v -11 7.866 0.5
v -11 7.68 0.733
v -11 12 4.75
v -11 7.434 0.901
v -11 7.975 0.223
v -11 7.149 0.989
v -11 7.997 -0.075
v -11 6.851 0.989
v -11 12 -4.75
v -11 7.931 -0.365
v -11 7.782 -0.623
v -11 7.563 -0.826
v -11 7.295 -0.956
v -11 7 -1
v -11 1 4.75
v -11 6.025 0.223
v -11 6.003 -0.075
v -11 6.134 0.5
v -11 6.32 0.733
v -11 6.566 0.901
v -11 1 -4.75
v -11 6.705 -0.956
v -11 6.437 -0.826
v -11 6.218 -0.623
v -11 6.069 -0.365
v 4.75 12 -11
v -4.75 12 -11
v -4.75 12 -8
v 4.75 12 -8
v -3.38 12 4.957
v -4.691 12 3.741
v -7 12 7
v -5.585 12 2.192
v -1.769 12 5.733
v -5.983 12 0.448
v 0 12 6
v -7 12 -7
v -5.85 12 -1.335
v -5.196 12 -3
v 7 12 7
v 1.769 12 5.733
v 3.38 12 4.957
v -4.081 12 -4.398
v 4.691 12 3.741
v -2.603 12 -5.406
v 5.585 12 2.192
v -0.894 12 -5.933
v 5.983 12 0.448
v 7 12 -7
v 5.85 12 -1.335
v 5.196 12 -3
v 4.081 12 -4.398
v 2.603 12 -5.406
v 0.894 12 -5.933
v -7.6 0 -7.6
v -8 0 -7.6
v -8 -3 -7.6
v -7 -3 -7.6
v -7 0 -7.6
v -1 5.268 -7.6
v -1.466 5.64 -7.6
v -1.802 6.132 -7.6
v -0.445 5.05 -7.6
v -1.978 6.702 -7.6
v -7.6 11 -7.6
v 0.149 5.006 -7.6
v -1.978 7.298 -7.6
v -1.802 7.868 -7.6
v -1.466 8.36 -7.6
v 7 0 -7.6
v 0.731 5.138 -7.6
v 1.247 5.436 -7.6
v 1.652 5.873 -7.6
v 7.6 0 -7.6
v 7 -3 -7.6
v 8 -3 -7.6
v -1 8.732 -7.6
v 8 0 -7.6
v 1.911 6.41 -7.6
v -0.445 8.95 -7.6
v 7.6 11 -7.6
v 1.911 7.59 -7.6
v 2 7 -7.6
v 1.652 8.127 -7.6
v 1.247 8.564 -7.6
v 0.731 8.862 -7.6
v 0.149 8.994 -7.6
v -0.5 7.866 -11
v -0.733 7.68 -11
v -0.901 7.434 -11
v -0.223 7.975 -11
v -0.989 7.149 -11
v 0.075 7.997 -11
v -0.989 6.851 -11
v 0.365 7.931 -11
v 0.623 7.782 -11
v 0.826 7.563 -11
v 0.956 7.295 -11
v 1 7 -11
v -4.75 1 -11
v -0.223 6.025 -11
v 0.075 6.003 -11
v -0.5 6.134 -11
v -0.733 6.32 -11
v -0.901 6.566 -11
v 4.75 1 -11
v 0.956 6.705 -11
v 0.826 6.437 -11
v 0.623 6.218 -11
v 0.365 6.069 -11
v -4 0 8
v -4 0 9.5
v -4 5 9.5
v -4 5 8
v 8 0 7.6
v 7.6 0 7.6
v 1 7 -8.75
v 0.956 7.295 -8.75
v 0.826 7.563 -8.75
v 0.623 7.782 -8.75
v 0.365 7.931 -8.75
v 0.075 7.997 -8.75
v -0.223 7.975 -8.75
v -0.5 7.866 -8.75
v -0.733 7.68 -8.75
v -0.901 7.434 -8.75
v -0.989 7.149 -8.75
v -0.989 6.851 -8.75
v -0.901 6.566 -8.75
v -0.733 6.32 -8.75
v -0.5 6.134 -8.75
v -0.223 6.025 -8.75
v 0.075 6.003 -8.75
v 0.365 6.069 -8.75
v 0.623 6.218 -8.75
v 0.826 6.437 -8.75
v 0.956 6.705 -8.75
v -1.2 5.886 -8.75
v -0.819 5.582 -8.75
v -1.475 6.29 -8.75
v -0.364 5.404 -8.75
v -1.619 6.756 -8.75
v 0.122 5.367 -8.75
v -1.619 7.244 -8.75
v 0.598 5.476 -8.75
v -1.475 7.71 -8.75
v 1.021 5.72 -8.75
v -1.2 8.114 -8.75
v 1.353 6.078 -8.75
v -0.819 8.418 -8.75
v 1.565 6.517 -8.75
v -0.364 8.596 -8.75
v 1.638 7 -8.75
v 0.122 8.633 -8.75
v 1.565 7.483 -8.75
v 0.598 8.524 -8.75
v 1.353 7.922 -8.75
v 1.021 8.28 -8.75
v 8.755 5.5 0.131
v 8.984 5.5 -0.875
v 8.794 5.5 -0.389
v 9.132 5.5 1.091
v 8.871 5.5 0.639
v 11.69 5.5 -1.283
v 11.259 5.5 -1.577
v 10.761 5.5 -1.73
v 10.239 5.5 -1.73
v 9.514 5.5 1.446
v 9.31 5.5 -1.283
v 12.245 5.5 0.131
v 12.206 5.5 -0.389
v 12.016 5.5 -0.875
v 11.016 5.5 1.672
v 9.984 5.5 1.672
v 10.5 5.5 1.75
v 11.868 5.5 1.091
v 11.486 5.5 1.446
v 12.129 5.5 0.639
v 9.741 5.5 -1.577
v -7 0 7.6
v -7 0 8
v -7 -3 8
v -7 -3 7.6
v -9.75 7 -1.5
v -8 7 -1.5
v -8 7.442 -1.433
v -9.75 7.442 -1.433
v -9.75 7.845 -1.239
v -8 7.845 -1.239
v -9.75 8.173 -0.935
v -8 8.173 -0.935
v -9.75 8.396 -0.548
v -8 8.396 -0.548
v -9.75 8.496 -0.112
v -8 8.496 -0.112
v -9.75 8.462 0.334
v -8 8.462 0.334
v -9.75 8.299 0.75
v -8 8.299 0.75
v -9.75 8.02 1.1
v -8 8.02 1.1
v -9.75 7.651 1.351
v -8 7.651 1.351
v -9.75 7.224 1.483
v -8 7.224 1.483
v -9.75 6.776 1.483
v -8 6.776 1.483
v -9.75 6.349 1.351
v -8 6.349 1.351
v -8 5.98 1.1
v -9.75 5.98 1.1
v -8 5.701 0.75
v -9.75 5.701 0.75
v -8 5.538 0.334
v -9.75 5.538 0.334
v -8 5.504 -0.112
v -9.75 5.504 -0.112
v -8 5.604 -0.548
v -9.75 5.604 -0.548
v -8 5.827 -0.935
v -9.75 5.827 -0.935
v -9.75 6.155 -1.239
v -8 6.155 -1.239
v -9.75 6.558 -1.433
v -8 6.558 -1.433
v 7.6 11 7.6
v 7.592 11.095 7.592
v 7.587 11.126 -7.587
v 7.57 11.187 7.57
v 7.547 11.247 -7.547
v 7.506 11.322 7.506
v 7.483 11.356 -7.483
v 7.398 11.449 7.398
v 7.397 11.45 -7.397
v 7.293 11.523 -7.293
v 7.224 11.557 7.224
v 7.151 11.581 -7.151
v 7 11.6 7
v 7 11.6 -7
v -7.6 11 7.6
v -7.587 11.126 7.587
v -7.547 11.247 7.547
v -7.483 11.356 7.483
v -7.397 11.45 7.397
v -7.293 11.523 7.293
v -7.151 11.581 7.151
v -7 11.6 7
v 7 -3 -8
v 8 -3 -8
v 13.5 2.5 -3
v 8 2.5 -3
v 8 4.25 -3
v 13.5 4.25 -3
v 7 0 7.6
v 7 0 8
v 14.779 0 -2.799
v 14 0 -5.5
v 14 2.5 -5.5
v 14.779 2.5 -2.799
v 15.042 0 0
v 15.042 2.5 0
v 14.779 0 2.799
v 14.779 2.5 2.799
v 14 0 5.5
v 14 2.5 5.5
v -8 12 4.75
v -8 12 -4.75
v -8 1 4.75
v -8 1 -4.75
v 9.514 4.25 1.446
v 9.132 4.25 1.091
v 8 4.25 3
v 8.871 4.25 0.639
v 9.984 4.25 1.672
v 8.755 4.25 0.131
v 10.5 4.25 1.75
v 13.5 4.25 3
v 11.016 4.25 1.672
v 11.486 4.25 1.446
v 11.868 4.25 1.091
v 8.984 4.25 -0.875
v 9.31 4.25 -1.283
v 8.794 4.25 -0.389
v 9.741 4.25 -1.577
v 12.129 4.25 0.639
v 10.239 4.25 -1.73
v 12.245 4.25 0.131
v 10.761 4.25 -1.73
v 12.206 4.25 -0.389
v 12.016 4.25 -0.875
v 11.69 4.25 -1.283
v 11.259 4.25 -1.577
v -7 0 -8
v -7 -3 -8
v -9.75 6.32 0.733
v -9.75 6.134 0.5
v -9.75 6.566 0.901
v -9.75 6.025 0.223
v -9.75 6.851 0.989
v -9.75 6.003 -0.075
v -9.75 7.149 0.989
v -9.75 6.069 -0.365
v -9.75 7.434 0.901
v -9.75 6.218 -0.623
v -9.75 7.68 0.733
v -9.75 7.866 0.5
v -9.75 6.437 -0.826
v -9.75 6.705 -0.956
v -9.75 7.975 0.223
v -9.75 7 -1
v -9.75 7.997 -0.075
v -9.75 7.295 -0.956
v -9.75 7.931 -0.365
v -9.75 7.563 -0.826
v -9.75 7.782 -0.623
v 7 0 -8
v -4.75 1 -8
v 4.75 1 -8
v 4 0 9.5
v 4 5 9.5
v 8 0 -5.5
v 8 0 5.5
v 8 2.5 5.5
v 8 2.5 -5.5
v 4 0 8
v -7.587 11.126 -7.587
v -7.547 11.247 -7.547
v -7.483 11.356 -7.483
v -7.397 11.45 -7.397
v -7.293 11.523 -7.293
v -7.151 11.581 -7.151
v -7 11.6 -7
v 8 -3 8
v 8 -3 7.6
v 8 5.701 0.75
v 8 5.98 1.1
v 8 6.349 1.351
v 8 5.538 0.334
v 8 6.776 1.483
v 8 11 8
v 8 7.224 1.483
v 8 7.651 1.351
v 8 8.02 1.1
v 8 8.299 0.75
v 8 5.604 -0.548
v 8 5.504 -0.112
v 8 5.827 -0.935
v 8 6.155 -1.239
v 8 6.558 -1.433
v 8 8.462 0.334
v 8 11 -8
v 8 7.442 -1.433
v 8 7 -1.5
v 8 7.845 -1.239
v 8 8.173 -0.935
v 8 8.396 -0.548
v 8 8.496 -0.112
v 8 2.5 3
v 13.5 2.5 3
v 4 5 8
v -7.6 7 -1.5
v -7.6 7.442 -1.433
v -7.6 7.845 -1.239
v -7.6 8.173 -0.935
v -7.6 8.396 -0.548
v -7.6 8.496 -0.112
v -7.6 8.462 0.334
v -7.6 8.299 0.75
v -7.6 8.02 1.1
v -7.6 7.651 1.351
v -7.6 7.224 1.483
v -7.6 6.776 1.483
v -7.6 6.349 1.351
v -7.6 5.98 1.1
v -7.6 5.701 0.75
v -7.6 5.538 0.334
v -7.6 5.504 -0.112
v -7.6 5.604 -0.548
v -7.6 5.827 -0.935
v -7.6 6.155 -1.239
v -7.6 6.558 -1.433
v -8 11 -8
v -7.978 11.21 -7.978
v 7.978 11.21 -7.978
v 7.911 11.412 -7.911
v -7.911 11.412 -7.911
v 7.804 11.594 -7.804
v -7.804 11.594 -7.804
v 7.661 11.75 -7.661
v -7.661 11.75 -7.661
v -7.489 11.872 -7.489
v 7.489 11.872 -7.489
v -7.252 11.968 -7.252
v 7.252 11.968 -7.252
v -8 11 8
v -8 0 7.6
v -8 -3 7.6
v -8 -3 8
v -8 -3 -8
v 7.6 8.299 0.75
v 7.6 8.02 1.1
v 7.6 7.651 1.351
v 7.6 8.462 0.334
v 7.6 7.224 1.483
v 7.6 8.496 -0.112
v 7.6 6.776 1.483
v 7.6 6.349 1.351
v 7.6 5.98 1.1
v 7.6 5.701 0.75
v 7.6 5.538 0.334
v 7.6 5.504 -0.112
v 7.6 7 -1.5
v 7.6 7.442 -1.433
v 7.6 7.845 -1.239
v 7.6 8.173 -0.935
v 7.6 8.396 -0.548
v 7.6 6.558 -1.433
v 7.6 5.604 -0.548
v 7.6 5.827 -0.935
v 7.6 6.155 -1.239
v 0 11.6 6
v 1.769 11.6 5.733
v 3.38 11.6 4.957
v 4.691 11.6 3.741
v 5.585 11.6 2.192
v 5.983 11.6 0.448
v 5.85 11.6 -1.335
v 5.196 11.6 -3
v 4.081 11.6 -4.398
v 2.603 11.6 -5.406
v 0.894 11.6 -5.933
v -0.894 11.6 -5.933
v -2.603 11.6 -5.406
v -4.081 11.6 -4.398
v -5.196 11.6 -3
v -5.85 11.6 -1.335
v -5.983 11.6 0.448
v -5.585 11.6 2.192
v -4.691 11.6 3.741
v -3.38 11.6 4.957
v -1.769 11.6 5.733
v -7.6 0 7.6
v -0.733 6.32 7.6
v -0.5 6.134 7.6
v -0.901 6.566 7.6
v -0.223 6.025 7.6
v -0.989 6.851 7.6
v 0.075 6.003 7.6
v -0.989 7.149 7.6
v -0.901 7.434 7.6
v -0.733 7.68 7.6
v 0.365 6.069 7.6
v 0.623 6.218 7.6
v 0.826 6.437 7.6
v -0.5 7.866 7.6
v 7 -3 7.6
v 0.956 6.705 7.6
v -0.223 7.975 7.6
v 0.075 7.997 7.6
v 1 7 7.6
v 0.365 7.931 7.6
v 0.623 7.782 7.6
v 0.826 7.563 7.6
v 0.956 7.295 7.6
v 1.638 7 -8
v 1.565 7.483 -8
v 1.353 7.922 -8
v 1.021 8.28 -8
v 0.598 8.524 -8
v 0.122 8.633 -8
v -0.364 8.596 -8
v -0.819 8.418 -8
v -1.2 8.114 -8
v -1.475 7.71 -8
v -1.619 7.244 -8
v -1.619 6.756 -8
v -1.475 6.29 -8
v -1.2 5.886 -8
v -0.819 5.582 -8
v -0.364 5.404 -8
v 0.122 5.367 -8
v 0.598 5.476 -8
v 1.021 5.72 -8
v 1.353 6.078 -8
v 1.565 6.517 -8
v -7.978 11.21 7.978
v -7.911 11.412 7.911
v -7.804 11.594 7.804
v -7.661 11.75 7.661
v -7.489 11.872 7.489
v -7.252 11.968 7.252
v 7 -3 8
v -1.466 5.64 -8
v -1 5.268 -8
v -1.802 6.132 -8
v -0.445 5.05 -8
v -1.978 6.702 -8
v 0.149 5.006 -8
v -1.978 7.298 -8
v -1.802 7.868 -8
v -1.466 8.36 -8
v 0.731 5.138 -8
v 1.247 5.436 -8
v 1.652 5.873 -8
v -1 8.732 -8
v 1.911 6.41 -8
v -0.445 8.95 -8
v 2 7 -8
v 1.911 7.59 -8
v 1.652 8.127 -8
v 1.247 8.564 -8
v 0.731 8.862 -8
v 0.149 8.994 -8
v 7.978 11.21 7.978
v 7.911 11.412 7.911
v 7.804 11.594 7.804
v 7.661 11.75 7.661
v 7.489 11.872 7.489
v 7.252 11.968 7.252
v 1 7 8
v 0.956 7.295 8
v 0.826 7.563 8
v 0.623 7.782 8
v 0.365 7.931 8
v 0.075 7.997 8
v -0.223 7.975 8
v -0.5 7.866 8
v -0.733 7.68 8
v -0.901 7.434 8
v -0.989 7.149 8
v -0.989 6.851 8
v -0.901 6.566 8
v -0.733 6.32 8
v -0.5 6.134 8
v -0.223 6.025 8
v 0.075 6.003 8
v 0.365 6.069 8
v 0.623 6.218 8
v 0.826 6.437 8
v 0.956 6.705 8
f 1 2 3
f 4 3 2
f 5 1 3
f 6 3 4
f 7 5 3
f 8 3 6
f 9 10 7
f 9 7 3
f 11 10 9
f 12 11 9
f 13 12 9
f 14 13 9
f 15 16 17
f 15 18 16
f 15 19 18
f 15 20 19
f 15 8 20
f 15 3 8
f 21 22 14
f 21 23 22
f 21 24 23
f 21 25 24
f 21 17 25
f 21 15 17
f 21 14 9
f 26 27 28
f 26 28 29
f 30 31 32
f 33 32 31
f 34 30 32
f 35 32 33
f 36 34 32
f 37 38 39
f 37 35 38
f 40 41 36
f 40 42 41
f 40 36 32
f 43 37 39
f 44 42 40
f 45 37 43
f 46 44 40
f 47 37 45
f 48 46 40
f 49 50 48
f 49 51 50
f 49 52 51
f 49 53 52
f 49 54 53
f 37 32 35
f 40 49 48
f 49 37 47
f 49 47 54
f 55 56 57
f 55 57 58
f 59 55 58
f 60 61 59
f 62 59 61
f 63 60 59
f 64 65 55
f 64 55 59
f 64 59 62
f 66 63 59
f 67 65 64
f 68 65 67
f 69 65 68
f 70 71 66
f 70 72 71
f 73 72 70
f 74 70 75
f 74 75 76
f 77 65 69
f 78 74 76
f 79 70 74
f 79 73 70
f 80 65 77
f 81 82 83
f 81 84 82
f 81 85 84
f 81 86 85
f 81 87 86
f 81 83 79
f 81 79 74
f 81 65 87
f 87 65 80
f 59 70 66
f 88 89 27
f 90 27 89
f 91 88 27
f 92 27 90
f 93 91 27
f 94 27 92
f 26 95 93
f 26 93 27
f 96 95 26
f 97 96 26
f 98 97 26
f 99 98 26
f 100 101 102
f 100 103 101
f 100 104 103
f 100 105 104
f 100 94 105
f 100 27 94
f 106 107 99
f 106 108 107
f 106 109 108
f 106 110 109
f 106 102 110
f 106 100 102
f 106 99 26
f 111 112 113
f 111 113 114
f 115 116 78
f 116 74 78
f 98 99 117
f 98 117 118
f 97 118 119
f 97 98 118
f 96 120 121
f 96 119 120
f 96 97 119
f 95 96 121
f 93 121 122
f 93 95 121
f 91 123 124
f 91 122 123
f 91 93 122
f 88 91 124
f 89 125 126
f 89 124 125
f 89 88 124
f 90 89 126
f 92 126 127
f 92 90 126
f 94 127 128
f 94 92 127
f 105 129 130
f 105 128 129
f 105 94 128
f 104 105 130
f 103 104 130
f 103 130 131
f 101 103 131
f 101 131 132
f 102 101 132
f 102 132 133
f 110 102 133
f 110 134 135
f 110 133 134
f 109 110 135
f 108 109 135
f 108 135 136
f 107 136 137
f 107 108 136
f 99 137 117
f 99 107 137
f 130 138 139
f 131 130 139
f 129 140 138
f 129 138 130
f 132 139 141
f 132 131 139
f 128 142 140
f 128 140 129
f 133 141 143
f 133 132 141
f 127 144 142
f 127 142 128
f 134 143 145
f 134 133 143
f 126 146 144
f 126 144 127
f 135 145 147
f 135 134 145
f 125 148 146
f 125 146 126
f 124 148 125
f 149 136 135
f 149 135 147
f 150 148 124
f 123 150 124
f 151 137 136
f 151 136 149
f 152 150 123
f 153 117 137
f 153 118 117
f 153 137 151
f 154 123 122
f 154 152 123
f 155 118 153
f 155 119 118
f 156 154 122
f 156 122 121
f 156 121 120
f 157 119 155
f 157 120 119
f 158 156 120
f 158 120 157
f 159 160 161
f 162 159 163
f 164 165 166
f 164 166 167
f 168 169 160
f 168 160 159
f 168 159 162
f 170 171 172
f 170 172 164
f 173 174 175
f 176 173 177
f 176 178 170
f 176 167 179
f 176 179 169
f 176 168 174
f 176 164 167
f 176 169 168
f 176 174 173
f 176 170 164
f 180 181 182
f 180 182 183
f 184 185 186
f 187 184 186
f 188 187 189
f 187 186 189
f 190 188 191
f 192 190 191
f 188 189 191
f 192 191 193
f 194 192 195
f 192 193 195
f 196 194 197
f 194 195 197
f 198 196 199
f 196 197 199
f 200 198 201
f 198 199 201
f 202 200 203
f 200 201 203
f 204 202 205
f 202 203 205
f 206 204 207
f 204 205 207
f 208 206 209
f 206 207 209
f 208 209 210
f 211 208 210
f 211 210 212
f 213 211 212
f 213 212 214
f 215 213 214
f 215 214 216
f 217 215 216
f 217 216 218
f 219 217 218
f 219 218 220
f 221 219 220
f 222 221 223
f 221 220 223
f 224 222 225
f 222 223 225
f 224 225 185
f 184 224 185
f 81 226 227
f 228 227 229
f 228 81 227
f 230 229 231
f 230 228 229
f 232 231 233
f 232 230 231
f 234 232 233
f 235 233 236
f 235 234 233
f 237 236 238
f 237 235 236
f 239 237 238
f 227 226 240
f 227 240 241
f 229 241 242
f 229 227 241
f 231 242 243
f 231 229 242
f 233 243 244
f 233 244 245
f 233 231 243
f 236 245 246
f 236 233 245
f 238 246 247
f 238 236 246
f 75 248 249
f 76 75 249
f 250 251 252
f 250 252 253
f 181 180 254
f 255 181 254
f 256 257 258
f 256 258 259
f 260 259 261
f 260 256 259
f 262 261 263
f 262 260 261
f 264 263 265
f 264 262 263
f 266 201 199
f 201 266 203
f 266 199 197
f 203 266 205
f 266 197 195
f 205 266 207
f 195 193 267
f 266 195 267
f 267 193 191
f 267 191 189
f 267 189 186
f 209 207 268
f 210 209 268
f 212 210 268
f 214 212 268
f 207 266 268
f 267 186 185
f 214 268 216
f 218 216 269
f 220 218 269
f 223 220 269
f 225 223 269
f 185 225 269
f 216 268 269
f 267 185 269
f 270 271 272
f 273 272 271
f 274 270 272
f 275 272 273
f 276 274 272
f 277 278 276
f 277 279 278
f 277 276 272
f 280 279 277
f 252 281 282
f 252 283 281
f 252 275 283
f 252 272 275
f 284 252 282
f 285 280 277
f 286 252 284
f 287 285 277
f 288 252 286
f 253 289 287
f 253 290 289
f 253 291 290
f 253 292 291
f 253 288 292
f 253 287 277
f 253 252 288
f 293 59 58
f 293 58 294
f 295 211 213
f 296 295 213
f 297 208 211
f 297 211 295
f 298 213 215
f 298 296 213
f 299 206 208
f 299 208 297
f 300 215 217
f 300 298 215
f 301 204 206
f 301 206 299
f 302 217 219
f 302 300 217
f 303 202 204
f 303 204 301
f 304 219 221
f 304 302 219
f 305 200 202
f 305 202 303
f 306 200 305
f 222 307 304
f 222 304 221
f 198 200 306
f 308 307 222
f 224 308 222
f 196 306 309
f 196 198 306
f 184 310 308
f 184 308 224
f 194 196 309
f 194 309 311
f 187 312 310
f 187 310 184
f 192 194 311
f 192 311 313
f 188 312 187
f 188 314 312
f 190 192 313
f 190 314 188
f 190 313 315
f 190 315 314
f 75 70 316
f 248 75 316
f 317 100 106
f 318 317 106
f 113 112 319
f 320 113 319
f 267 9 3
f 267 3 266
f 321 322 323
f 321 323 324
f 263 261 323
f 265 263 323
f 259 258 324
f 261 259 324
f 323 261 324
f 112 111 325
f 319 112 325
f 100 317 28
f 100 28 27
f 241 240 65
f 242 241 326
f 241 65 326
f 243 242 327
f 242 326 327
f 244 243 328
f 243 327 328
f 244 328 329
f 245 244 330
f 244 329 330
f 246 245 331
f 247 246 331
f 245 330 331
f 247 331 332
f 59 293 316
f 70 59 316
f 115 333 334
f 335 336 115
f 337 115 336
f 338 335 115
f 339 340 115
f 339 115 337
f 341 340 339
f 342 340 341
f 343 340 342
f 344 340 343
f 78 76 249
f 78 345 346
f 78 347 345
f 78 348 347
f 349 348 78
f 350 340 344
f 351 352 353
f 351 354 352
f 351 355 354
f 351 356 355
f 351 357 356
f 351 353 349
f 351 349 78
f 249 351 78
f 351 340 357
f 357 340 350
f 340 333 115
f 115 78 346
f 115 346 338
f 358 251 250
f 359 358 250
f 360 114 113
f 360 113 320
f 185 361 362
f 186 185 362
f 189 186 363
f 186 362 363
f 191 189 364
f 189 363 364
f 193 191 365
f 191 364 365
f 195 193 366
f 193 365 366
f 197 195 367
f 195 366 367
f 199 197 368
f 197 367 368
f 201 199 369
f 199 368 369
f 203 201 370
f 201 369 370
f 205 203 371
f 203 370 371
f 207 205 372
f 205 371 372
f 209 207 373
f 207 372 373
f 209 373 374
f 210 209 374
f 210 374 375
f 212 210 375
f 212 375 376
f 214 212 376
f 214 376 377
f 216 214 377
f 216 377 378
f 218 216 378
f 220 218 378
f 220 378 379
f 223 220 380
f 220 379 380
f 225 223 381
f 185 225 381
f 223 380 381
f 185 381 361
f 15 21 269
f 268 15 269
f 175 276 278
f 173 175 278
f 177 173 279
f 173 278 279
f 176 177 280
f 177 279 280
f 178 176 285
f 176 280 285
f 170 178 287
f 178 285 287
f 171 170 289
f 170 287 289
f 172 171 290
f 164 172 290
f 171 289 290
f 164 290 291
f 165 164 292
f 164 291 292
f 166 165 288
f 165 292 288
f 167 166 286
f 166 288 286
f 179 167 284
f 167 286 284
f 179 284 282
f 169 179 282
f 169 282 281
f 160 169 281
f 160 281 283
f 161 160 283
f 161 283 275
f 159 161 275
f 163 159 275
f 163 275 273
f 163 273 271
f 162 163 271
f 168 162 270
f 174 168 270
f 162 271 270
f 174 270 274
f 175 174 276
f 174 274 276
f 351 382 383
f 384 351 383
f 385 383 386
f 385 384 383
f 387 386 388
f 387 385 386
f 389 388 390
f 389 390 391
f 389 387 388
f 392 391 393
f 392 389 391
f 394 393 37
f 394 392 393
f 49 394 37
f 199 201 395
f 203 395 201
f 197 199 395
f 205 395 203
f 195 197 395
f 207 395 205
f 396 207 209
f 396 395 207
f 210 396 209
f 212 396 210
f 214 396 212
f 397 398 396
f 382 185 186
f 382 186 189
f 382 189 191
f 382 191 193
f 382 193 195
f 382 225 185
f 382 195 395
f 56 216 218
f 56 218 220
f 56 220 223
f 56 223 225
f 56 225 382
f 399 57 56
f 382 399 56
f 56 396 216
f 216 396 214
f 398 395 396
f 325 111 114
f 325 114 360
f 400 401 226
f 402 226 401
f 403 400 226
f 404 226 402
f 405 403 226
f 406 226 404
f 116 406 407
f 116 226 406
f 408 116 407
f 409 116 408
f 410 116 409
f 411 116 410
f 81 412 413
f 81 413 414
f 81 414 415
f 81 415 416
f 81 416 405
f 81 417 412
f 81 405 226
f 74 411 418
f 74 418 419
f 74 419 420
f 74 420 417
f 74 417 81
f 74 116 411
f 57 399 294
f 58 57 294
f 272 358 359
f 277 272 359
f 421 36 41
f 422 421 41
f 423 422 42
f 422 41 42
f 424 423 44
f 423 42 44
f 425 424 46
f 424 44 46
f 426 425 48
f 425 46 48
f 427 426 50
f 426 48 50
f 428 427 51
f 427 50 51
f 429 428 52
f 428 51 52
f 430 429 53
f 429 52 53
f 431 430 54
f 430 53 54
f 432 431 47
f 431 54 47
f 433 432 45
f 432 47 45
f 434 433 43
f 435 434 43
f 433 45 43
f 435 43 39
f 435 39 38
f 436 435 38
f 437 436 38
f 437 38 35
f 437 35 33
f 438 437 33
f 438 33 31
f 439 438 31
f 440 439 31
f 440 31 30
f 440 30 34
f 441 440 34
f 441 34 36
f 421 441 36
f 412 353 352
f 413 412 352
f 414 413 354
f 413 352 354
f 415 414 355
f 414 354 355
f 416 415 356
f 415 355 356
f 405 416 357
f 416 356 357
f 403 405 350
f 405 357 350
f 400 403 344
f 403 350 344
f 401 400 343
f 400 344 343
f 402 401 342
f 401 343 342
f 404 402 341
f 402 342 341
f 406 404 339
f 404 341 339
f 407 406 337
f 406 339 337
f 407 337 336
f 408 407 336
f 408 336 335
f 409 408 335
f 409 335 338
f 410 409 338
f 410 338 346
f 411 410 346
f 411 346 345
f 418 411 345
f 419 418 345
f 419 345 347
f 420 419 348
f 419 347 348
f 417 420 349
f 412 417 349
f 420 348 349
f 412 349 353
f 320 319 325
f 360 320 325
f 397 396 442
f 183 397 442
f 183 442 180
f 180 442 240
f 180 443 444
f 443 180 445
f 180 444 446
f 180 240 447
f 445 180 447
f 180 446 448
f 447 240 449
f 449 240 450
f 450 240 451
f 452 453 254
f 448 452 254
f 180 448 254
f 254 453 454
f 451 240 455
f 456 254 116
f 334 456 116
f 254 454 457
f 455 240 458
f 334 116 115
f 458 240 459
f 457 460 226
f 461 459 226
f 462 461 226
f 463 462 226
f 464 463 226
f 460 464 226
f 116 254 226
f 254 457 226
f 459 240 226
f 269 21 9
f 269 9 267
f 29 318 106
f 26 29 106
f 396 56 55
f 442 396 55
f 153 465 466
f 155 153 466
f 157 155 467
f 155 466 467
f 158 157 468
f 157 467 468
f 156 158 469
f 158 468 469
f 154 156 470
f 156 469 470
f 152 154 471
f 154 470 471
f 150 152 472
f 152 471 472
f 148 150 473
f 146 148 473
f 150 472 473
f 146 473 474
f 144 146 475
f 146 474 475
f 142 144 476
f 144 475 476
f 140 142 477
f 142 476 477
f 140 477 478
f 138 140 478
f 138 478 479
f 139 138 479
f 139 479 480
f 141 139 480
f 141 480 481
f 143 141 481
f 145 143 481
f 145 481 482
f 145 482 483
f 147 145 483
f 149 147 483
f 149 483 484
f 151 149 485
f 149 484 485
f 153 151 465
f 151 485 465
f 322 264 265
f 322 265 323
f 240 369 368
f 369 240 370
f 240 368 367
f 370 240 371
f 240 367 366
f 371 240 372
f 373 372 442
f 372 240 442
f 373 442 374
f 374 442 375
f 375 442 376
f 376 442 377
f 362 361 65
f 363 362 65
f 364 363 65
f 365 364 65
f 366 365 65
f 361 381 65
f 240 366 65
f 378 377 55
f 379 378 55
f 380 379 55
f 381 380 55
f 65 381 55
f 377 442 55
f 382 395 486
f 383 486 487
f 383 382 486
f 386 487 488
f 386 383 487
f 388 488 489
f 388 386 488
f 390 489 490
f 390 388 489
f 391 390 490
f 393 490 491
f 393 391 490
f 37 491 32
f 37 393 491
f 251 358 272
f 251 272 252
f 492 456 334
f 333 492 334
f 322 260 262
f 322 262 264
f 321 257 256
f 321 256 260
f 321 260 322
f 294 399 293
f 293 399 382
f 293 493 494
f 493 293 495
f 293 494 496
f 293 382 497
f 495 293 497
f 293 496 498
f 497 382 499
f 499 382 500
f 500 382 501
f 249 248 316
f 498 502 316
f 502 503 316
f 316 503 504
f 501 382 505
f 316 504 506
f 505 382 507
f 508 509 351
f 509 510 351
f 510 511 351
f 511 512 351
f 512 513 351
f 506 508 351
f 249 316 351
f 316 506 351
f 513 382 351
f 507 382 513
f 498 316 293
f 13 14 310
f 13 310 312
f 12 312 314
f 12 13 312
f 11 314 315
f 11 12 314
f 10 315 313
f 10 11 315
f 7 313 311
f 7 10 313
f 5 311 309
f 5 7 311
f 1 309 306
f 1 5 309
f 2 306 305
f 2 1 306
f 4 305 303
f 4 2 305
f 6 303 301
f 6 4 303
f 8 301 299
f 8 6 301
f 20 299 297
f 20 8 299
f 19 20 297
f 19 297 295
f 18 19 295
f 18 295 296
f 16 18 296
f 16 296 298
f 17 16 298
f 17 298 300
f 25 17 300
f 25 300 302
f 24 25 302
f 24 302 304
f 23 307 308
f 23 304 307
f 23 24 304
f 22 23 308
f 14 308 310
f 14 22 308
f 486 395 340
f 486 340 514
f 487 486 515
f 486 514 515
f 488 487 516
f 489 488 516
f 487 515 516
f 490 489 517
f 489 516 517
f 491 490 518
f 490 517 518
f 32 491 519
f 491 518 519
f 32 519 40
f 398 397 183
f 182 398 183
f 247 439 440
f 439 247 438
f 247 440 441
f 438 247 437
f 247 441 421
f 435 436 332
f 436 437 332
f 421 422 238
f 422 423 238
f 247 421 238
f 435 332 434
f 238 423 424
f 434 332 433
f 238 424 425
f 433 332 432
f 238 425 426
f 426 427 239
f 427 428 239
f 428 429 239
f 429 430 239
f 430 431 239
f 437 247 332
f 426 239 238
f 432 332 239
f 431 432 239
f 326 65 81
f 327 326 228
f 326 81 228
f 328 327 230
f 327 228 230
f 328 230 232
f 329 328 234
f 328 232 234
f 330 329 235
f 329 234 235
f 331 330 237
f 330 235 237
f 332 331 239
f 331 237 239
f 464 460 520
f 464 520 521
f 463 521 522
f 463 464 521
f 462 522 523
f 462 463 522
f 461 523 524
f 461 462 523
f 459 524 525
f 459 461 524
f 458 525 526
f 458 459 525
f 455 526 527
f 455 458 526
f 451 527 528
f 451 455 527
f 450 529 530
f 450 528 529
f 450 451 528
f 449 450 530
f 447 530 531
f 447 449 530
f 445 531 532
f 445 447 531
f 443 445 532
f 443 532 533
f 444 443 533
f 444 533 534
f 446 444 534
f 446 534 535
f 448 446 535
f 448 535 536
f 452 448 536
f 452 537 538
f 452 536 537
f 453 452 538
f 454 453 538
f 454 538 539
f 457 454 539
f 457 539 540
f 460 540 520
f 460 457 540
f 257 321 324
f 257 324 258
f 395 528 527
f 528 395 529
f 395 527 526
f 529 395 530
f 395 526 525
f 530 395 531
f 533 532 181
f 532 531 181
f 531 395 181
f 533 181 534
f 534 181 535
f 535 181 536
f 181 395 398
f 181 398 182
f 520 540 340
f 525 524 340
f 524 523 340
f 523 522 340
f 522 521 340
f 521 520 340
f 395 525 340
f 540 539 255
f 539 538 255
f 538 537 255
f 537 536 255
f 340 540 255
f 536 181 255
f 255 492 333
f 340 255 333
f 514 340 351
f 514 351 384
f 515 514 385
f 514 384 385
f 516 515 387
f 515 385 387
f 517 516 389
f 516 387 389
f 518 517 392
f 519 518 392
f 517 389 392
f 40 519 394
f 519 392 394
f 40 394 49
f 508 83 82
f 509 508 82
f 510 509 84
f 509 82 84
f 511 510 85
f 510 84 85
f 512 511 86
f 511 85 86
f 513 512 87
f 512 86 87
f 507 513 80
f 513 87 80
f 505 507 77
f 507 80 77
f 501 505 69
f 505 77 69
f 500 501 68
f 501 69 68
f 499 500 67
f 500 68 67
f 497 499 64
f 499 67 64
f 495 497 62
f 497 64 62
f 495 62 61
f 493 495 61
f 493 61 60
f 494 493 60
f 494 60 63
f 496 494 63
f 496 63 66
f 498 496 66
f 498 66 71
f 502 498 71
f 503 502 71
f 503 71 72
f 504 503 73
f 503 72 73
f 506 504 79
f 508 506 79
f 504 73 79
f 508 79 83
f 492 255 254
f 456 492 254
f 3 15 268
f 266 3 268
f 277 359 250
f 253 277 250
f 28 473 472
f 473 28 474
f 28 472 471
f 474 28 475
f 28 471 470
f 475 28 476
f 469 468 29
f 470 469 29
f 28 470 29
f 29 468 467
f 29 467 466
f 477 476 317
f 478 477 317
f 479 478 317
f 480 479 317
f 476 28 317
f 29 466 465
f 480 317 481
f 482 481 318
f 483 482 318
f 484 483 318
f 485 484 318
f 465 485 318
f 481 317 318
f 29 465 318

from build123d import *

# Parameters (mm, degrees)
SKETCH1_W            = 16
SKETCH1_H            = 16
EXTRUDE1_DEPTH       = 12
FILLET1_R            = 1
SHELL1_T             = -0.4
SKETCH2_R            = 6
EXTRUDE2_DEPTH       = 17.492422502
SKETCH4_W            = 8
SKETCH4_H            = 1.5
EXTRUDE3_DEPTH       = 5
EXTRUDE4_START       = 1
SKETCH5_W            = 3
SKETCH5_H            = 9.5
EXTRUDE4_DEPTH       = 11
EXTRUDE5_START       = 1
SKETCH6_W            = 9.5
SKETCH6_H            = 3
EXTRUDE5_DEPTH       = 11
EXTRUDE6_DEPTH       = 2.5
SKETCH8_W            = 5.5
SKETCH8_H            = 6
EXTRUDE7_DEPTH       = 1.75
SKETCH9_R            = 1.75
EXTRUDE8_DEPTH       = 1.25
EXTRUDE9_DEPTH       = 23.164160259
EXTRUDE9_DEPTH_BACK  = 23.164160259
SKETCH10_R           = 1
EXTRUDE10_DEPTH      = 23.164160259
EXTRUDE10_DEPTH_BACK = 23.164160259
SKETCH11_R           = 1
SKETCH12_W           = 1
SKETCH12_H           = 0.4
EXTRUDE11_DEPTH      = 3
SKETCH13_R           = 1.5
EXTRUDE12_DEPTH      = 0.4
SKETCH14_R           = 1.5
EXTRUDE13_DEPTH      = 0.4
SKETCH15_R           = 1.5
CUT_EXTRUDE1_DEPTH   = 1.75
SKETCH17_R           = 1.6375
CUT_EXTRUDE2_DEPTH   = 0.75
SKETCH18_R           = 1.5
CUT_EXTRUDE3_DEPTH   = 0.4
SKETCH19_R           = 2
EXTRUDE14_DEPTH      = 0.4


with BuildPart() as part:
    # Sketch1 → Extrude1 (new body)
    with BuildSketch(Plane(origin=(0, 0, 0), x_dir=(1, 0, 0), z_dir=(0, 1, 0))):
        Rectangle(SKETCH1_W, SKETCH1_H)
    extrude(amount=EXTRUDE1_DEPTH)

    # Fillet1
    fillet1_edges = [part.edges().sort_by_distance(p)[0] for p in [
        (-8, 12, 0),
        (0, 12, 8),
        (8, 12, 0),
        (0, 12, -8),
    ]]
    fillet(fillet1_edges, radius=FILLET1_R)

    # Shell1
    shell1_openings = [part.faces().sort_by_distance(p)[0] for p in [
        (0, 0, 0),
    ]]
    offset(amount=SHELL1_T, openings=shell1_openings)

    # Sketch2 → Extrude2 (cut, through all)
    with BuildSketch(Plane(origin=(0, 12, 0), x_dir=(1, 0, 0), z_dir=(0, 1, 0))):
        with Locations(Location((0, 0, 0), (0, 0, 270))):
            Circle(SKETCH2_R)
    extrude(amount=-EXTRUDE2_DEPTH, mode=Mode.SUBTRACT)


with BuildPart() as body_2:
    # Sketch4 → Extrude3 (new body)
    with BuildSketch(Plane(origin=(0, 0, 0), x_dir=(1, 0, 0), z_dir=(0, 1, 0))):
        with Locations((0, -8.75)):
            Rectangle(SKETCH4_W, SKETCH4_H)
    extrude(amount=EXTRUDE3_DEPTH)


with BuildPart() as body_3:
    # Sketch5 → Extrude4 (new body)
    with BuildSketch(Plane(origin=(0, 0, 0), x_dir=(1, 0, 0), z_dir=(0, 1, 0)).offset(EXTRUDE4_START)):
        with Locations((-9.5, 0)):
            Rectangle(SKETCH5_W, SKETCH5_H)
    extrude(amount=EXTRUDE4_DEPTH)


with BuildPart() as body_4:
    # Sketch6 → Extrude5 (new body)
    with BuildSketch(Plane(origin=(0, 0, 0), x_dir=(1, 0, 0), z_dir=(0, 1, 0)).offset(EXTRUDE5_START)):
        with Locations((0, 9.5)):
            Rectangle(SKETCH6_W, SKETCH6_H)
    extrude(amount=EXTRUDE5_DEPTH)


with BuildPart() as body_5:
    # Sketch7 → Extrude6 (new body)
    with BuildSketch(Plane(origin=(0, 0, 0), x_dir=(1, 0, 0), z_dir=(0, 1, 0))):
        with BuildLine():
            Line((8, 5.5), (14, 5.5))
            ThreePointArc((14, 5.5), (15.041608956, 0), (14, -5.5))
            Line((14, -5.5), (8, -5.5))
            Line((8, -5.5), (8, 5.5))
        make_face()
    extrude(amount=EXTRUDE6_DEPTH)


with BuildPart() as body_6:
    # Sketch8 → Extrude7 (new body)
    with BuildSketch(Plane(origin=(0, 2.5, 0), x_dir=(1, 0, 0), z_dir=(0, 1, 0))):
        with Locations((10.75, 0)):
            Rectangle(SKETCH8_W, SKETCH8_H)
    extrude(amount=EXTRUDE7_DEPTH)

    # Sketch9 → Extrude8 (add)
    with BuildSketch(Plane(origin=(0, 4.25, 0), x_dir=(1, 0, 0), z_dir=(0, 1, 0))):
        with Locations(Location((10.5, 0, 0), (0, 0, 270))):
            Circle(SKETCH9_R)
    extrude(amount=EXTRUDE8_DEPTH)


with BuildPart() as extrude9_tool:
    # Sketch10 → Extrude9 (new, two sides: drawn at the far end of the back side and taken through both)
    with BuildSketch(Plane.XY.offset(-EXTRUDE9_DEPTH_BACK)):
        with Locations((0, 7)):
            Circle(SKETCH10_R)
    extrude(amount=EXTRUDE9_DEPTH + EXTRUDE9_DEPTH_BACK)


with BuildPart() as part_1:
    add(part.part)

    # Extrude9: cut by extrude9_tool
    add(extrude9_tool.part, mode=Mode.SUBTRACT)


with BuildPart() as body_4_1:
    add(body_4.part)

    # Extrude9: cut by extrude9_tool
    add(extrude9_tool.part, mode=Mode.SUBTRACT)

    # Sketch17 → Cut-Extrude2 (cut)
    with BuildSketch(Plane.XY.offset(-8)):
        with Locations((0, 7)):
            Circle(SKETCH17_R)
    extrude(amount=-CUT_EXTRUDE2_DEPTH, mode=Mode.SUBTRACT)


with BuildPart() as extrude10_tool:
    # Sketch11 → Extrude10 (new, two sides: drawn at the far end of the back side and taken through both)
    with BuildSketch(Plane(origin=(0, 0, 0), x_dir=(0, 0, -1), z_dir=(1, 0, 0)).offset(-EXTRUDE10_DEPTH_BACK)):
        with Locations((0, 7)):
            Circle(SKETCH11_R)
    extrude(amount=EXTRUDE10_DEPTH + EXTRUDE10_DEPTH_BACK)


with BuildPart() as part_2:
    add(part_1.part)

    # Extrude10: cut by extrude10_tool
    add(extrude10_tool.part, mode=Mode.SUBTRACT)

    # Sketch12 → Extrude11 (add)
    with BuildSketch(Plane(origin=(0, 0, 0), x_dir=(1, 0, 0), z_dir=(0, 1, 0))):
        with Locations((7.5, 7.8)):
            Rectangle(SKETCH12_W, SKETCH12_H)
        with Locations((-7.5, 7.8)):
            Rectangle(SKETCH12_W, SKETCH12_H)
        with Locations((7.5, -7.8)):
            Rectangle(SKETCH12_W, SKETCH12_H)
        with Locations((-7.5, -7.8)):
            Rectangle(SKETCH12_W, SKETCH12_H)
    extrude(amount=-EXTRUDE11_DEPTH)

    # Sketch13 → Extrude12 (cut)
    with BuildSketch(Plane.XY.offset(-7.6)):
        with Locations((0, 7)):
            Circle(SKETCH13_R)
    extrude(amount=-EXTRUDE12_DEPTH, mode=Mode.SUBTRACT)

    # Sketch14 → Extrude13 (cut)
    with BuildSketch(Plane(origin=(-7.6, 0, 0), x_dir=(0, 0, -1), z_dir=(1, 0, 0))):
        with Locations((0, 7)):
            Circle(SKETCH14_R)
    extrude(amount=-EXTRUDE13_DEPTH, mode=Mode.SUBTRACT)

    # Sketch18 → Cut-Extrude3 (cut)
    with BuildSketch(Plane(origin=(8, 0, 0), x_dir=(0, 0, -1), z_dir=(1, 0, 0))):
        with Locations((0, 7)):
            Circle(SKETCH18_R)
    extrude(amount=-CUT_EXTRUDE3_DEPTH, mode=Mode.SUBTRACT)

    # Sketch19 → Extrude14 (cut)
    with BuildSketch(Plane.XY.offset(-7.6)):
        with Locations((0, 7)):
            Circle(SKETCH19_R)
    extrude(amount=-EXTRUDE14_DEPTH, mode=Mode.SUBTRACT)


with BuildPart() as body_3_1:
    add(body_3.part)

    # Extrude10: cut by extrude10_tool
    add(extrude10_tool.part, mode=Mode.SUBTRACT)

    # Sketch15 → Cut-Extrude1 (cut)
    with BuildSketch(Plane(origin=(-8, 0, 0), x_dir=(0, 0, -1), z_dir=(1, 0, 0))):
        with Locations((0, 7)):
            Circle(SKETCH15_R)
    extrude(amount=-CUT_EXTRUDE1_DEPTH, mode=Mode.SUBTRACT)


solid = Compound([body_2.part, body_5.part, body_6.part, body_4_1.part, part_2.part, body_3_1.part])
